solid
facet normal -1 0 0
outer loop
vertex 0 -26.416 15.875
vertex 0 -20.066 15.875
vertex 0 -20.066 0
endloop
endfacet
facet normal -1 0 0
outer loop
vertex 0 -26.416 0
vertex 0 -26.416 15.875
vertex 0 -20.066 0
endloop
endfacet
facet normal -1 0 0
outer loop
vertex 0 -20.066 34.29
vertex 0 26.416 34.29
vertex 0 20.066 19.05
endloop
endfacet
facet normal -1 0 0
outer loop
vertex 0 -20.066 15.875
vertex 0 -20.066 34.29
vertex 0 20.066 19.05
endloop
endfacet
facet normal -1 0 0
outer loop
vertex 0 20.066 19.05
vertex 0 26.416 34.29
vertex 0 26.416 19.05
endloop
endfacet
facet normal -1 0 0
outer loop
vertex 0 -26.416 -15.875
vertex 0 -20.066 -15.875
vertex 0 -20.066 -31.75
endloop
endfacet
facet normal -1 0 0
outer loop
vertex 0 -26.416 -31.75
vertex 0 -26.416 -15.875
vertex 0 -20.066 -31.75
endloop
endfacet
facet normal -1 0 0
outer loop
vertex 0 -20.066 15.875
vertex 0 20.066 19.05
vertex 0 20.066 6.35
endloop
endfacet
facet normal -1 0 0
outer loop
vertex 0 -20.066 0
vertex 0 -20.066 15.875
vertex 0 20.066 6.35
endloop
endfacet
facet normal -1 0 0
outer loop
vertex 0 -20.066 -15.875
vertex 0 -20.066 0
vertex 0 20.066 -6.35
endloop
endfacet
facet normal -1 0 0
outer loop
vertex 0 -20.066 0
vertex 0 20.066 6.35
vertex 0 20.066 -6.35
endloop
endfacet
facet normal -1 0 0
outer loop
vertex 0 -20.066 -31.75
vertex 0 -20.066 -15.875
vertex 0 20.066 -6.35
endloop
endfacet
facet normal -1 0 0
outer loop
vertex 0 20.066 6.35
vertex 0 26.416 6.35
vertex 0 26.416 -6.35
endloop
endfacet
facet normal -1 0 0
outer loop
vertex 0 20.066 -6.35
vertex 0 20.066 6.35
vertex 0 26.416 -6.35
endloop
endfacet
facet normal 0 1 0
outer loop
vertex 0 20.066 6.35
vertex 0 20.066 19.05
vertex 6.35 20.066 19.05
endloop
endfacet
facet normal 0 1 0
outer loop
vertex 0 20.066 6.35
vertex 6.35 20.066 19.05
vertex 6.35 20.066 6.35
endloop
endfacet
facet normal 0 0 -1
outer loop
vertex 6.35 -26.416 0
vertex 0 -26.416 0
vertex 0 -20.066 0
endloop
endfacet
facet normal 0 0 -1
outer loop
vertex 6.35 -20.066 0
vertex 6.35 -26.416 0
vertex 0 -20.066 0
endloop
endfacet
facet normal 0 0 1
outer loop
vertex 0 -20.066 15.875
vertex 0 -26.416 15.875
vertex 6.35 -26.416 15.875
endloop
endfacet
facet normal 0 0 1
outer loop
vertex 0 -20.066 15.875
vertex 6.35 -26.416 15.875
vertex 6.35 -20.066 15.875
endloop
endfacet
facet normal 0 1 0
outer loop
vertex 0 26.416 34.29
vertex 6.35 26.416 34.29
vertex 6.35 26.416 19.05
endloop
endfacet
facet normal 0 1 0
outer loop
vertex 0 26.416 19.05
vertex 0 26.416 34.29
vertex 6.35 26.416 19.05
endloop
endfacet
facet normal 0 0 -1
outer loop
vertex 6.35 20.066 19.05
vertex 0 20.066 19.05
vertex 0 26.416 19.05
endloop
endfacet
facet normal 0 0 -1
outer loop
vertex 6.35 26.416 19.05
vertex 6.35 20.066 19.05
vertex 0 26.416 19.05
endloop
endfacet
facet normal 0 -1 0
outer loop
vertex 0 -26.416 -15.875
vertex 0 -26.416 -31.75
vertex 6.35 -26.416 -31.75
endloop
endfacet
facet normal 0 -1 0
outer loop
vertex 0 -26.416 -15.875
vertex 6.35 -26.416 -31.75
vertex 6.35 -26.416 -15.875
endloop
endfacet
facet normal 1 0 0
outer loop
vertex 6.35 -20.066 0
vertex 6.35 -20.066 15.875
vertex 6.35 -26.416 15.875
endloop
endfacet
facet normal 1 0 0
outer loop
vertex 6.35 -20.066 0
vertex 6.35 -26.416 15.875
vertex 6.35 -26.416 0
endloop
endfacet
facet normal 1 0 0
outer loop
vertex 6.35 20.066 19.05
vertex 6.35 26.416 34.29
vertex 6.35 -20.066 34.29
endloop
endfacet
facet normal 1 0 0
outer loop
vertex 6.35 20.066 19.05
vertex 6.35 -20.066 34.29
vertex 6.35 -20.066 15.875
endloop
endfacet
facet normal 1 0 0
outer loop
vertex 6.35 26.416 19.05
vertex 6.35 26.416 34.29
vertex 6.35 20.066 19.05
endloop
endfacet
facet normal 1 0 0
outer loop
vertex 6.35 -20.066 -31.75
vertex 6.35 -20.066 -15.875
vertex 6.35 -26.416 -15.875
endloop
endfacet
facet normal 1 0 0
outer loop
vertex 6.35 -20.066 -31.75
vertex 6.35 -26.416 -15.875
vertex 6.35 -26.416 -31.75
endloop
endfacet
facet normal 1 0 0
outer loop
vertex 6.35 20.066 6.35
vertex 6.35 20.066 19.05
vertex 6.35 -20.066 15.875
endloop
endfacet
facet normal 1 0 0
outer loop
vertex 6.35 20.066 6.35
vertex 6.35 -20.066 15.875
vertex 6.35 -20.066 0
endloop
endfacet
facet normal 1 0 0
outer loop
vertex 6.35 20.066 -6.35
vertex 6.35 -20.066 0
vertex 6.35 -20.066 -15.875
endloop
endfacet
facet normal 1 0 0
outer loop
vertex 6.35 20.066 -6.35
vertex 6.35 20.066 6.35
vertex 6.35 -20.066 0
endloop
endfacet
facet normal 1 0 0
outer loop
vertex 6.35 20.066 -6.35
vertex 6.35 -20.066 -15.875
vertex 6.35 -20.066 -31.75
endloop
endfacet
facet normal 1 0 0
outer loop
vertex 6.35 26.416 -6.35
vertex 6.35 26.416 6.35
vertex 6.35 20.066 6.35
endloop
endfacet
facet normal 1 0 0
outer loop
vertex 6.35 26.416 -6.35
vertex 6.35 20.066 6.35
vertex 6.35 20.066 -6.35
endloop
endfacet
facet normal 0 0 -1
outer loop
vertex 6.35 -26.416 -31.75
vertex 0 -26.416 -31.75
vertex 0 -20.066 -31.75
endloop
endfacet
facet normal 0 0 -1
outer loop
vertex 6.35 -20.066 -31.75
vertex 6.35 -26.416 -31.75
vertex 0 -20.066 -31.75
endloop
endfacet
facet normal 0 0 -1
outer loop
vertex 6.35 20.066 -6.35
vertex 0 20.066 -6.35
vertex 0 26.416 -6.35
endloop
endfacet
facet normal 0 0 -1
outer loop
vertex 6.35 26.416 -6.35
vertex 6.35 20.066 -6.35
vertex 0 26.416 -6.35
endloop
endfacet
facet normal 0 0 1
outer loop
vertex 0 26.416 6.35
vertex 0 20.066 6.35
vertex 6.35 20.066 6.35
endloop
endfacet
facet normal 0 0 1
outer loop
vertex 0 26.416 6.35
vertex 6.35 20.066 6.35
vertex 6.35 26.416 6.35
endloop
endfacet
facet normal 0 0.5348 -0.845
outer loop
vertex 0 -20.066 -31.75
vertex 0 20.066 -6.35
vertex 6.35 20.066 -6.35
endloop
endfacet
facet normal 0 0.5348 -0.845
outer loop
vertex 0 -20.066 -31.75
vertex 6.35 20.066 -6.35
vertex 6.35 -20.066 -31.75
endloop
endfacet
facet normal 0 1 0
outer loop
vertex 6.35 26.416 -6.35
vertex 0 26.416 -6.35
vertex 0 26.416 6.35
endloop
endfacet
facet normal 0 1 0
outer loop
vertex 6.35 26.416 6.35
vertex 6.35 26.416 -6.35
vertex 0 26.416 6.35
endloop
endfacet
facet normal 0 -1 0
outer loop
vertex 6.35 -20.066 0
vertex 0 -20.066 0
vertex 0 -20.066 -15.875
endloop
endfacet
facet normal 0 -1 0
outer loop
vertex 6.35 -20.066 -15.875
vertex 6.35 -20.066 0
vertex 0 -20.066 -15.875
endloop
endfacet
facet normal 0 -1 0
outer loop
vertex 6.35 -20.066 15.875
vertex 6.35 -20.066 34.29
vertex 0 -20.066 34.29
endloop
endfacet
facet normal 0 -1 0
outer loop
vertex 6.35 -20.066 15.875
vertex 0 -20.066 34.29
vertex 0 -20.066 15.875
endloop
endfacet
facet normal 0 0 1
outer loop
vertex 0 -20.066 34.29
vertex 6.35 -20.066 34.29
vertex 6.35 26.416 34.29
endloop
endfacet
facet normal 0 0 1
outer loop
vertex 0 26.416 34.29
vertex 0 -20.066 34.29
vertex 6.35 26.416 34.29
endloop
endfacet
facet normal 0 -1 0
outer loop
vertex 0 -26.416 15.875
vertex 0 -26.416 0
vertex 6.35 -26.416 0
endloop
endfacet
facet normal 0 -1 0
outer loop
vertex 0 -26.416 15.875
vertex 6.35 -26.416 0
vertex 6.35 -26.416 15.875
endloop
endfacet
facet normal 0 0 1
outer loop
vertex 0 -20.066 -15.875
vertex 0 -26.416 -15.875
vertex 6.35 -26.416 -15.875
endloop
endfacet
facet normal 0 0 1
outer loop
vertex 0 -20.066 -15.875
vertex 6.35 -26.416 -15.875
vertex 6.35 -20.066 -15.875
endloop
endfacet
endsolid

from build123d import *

# Parameters (mm, degrees)
SKETCH1_W           = 63.5
SKETCH1_H           = 40.132
BOSS_EXTRUDE1_DEPTH = 6.35
CUT_EXTRUDE1_DEPTH  = 7.35
SKETCH3_W           = 12.7
SKETCH3_H           = 6.35
SKETCH3_W_2         = 15.875
BOSS_EXTRUDE2_DEPTH = 6.35
SKETCH4_W           = 2.54
SKETCH4_H           = 37.084
BOSS_EXTRUDE7_DEPTH = 6.35
SKETCH6_W           = 2.54
SKETCH6_H           = 46.482
BOSS_EXTRUDE8_DEPTH = 6.35


with BuildPart() as part:
    # Sketch1 → Boss-Extrude1 (new body)
    with BuildSketch(Plane(origin=(0, 0, 0), x_dir=(0, 0, -1), z_dir=(1, 0, 0))):
        Rectangle(SKETCH1_W, SKETCH1_H)
    extrude(amount=BOSS_EXTRUDE1_DEPTH)

    # Sketch2 → Cut-Extrude1 (cut, through all)
    with BuildSketch(Plane.ZY):
        Polygon((-31.75, -20.066), (-31.75, 20.066), (-6.35, 20.066), align=None)
    extrude(amount=-CUT_EXTRUDE1_DEPTH, mode=Mode.SUBTRACT)

    # Sketch3 → Boss-Extrude2 (add, through all)
    with BuildSketch(Plane.ZY):
        with Locations((25.4, 23.241)):
            Rectangle(SKETCH3_W, SKETCH3_H)
        with Locations((0, 23.241)):
            Rectangle(SKETCH3_W, SKETCH3_H)
        with Locations((7.9375, -23.241)):
            Rectangle(SKETCH3_W_2, SKETCH3_H)
        with Locations((-23.8125, -23.241)):
            Rectangle(SKETCH3_W_2, SKETCH3_H)
    extrude(amount=-BOSS_EXTRUDE2_DEPTH)

    # Sketch4 → Boss-Extrude7 (add)
    with BuildSketch(Plane.ZY):
        with Locations((30.48, 2.667)):
            Rectangle(SKETCH4_W, SKETCH4_H)
    extrude(amount=-BOSS_EXTRUDE7_DEPTH)

    # Sketch6 → Boss-Extrude8 (add)
    with BuildSketch(Plane(origin=(6.35, 0, 0), x_dir=(0, 0, -1), z_dir=(1, 0, 0))):
        with Locations((-33.02, 3.175)):
            Rectangle(SKETCH6_W, SKETCH6_H)
    extrude(amount=-BOSS_EXTRUDE8_DEPTH)


solid = part.part
